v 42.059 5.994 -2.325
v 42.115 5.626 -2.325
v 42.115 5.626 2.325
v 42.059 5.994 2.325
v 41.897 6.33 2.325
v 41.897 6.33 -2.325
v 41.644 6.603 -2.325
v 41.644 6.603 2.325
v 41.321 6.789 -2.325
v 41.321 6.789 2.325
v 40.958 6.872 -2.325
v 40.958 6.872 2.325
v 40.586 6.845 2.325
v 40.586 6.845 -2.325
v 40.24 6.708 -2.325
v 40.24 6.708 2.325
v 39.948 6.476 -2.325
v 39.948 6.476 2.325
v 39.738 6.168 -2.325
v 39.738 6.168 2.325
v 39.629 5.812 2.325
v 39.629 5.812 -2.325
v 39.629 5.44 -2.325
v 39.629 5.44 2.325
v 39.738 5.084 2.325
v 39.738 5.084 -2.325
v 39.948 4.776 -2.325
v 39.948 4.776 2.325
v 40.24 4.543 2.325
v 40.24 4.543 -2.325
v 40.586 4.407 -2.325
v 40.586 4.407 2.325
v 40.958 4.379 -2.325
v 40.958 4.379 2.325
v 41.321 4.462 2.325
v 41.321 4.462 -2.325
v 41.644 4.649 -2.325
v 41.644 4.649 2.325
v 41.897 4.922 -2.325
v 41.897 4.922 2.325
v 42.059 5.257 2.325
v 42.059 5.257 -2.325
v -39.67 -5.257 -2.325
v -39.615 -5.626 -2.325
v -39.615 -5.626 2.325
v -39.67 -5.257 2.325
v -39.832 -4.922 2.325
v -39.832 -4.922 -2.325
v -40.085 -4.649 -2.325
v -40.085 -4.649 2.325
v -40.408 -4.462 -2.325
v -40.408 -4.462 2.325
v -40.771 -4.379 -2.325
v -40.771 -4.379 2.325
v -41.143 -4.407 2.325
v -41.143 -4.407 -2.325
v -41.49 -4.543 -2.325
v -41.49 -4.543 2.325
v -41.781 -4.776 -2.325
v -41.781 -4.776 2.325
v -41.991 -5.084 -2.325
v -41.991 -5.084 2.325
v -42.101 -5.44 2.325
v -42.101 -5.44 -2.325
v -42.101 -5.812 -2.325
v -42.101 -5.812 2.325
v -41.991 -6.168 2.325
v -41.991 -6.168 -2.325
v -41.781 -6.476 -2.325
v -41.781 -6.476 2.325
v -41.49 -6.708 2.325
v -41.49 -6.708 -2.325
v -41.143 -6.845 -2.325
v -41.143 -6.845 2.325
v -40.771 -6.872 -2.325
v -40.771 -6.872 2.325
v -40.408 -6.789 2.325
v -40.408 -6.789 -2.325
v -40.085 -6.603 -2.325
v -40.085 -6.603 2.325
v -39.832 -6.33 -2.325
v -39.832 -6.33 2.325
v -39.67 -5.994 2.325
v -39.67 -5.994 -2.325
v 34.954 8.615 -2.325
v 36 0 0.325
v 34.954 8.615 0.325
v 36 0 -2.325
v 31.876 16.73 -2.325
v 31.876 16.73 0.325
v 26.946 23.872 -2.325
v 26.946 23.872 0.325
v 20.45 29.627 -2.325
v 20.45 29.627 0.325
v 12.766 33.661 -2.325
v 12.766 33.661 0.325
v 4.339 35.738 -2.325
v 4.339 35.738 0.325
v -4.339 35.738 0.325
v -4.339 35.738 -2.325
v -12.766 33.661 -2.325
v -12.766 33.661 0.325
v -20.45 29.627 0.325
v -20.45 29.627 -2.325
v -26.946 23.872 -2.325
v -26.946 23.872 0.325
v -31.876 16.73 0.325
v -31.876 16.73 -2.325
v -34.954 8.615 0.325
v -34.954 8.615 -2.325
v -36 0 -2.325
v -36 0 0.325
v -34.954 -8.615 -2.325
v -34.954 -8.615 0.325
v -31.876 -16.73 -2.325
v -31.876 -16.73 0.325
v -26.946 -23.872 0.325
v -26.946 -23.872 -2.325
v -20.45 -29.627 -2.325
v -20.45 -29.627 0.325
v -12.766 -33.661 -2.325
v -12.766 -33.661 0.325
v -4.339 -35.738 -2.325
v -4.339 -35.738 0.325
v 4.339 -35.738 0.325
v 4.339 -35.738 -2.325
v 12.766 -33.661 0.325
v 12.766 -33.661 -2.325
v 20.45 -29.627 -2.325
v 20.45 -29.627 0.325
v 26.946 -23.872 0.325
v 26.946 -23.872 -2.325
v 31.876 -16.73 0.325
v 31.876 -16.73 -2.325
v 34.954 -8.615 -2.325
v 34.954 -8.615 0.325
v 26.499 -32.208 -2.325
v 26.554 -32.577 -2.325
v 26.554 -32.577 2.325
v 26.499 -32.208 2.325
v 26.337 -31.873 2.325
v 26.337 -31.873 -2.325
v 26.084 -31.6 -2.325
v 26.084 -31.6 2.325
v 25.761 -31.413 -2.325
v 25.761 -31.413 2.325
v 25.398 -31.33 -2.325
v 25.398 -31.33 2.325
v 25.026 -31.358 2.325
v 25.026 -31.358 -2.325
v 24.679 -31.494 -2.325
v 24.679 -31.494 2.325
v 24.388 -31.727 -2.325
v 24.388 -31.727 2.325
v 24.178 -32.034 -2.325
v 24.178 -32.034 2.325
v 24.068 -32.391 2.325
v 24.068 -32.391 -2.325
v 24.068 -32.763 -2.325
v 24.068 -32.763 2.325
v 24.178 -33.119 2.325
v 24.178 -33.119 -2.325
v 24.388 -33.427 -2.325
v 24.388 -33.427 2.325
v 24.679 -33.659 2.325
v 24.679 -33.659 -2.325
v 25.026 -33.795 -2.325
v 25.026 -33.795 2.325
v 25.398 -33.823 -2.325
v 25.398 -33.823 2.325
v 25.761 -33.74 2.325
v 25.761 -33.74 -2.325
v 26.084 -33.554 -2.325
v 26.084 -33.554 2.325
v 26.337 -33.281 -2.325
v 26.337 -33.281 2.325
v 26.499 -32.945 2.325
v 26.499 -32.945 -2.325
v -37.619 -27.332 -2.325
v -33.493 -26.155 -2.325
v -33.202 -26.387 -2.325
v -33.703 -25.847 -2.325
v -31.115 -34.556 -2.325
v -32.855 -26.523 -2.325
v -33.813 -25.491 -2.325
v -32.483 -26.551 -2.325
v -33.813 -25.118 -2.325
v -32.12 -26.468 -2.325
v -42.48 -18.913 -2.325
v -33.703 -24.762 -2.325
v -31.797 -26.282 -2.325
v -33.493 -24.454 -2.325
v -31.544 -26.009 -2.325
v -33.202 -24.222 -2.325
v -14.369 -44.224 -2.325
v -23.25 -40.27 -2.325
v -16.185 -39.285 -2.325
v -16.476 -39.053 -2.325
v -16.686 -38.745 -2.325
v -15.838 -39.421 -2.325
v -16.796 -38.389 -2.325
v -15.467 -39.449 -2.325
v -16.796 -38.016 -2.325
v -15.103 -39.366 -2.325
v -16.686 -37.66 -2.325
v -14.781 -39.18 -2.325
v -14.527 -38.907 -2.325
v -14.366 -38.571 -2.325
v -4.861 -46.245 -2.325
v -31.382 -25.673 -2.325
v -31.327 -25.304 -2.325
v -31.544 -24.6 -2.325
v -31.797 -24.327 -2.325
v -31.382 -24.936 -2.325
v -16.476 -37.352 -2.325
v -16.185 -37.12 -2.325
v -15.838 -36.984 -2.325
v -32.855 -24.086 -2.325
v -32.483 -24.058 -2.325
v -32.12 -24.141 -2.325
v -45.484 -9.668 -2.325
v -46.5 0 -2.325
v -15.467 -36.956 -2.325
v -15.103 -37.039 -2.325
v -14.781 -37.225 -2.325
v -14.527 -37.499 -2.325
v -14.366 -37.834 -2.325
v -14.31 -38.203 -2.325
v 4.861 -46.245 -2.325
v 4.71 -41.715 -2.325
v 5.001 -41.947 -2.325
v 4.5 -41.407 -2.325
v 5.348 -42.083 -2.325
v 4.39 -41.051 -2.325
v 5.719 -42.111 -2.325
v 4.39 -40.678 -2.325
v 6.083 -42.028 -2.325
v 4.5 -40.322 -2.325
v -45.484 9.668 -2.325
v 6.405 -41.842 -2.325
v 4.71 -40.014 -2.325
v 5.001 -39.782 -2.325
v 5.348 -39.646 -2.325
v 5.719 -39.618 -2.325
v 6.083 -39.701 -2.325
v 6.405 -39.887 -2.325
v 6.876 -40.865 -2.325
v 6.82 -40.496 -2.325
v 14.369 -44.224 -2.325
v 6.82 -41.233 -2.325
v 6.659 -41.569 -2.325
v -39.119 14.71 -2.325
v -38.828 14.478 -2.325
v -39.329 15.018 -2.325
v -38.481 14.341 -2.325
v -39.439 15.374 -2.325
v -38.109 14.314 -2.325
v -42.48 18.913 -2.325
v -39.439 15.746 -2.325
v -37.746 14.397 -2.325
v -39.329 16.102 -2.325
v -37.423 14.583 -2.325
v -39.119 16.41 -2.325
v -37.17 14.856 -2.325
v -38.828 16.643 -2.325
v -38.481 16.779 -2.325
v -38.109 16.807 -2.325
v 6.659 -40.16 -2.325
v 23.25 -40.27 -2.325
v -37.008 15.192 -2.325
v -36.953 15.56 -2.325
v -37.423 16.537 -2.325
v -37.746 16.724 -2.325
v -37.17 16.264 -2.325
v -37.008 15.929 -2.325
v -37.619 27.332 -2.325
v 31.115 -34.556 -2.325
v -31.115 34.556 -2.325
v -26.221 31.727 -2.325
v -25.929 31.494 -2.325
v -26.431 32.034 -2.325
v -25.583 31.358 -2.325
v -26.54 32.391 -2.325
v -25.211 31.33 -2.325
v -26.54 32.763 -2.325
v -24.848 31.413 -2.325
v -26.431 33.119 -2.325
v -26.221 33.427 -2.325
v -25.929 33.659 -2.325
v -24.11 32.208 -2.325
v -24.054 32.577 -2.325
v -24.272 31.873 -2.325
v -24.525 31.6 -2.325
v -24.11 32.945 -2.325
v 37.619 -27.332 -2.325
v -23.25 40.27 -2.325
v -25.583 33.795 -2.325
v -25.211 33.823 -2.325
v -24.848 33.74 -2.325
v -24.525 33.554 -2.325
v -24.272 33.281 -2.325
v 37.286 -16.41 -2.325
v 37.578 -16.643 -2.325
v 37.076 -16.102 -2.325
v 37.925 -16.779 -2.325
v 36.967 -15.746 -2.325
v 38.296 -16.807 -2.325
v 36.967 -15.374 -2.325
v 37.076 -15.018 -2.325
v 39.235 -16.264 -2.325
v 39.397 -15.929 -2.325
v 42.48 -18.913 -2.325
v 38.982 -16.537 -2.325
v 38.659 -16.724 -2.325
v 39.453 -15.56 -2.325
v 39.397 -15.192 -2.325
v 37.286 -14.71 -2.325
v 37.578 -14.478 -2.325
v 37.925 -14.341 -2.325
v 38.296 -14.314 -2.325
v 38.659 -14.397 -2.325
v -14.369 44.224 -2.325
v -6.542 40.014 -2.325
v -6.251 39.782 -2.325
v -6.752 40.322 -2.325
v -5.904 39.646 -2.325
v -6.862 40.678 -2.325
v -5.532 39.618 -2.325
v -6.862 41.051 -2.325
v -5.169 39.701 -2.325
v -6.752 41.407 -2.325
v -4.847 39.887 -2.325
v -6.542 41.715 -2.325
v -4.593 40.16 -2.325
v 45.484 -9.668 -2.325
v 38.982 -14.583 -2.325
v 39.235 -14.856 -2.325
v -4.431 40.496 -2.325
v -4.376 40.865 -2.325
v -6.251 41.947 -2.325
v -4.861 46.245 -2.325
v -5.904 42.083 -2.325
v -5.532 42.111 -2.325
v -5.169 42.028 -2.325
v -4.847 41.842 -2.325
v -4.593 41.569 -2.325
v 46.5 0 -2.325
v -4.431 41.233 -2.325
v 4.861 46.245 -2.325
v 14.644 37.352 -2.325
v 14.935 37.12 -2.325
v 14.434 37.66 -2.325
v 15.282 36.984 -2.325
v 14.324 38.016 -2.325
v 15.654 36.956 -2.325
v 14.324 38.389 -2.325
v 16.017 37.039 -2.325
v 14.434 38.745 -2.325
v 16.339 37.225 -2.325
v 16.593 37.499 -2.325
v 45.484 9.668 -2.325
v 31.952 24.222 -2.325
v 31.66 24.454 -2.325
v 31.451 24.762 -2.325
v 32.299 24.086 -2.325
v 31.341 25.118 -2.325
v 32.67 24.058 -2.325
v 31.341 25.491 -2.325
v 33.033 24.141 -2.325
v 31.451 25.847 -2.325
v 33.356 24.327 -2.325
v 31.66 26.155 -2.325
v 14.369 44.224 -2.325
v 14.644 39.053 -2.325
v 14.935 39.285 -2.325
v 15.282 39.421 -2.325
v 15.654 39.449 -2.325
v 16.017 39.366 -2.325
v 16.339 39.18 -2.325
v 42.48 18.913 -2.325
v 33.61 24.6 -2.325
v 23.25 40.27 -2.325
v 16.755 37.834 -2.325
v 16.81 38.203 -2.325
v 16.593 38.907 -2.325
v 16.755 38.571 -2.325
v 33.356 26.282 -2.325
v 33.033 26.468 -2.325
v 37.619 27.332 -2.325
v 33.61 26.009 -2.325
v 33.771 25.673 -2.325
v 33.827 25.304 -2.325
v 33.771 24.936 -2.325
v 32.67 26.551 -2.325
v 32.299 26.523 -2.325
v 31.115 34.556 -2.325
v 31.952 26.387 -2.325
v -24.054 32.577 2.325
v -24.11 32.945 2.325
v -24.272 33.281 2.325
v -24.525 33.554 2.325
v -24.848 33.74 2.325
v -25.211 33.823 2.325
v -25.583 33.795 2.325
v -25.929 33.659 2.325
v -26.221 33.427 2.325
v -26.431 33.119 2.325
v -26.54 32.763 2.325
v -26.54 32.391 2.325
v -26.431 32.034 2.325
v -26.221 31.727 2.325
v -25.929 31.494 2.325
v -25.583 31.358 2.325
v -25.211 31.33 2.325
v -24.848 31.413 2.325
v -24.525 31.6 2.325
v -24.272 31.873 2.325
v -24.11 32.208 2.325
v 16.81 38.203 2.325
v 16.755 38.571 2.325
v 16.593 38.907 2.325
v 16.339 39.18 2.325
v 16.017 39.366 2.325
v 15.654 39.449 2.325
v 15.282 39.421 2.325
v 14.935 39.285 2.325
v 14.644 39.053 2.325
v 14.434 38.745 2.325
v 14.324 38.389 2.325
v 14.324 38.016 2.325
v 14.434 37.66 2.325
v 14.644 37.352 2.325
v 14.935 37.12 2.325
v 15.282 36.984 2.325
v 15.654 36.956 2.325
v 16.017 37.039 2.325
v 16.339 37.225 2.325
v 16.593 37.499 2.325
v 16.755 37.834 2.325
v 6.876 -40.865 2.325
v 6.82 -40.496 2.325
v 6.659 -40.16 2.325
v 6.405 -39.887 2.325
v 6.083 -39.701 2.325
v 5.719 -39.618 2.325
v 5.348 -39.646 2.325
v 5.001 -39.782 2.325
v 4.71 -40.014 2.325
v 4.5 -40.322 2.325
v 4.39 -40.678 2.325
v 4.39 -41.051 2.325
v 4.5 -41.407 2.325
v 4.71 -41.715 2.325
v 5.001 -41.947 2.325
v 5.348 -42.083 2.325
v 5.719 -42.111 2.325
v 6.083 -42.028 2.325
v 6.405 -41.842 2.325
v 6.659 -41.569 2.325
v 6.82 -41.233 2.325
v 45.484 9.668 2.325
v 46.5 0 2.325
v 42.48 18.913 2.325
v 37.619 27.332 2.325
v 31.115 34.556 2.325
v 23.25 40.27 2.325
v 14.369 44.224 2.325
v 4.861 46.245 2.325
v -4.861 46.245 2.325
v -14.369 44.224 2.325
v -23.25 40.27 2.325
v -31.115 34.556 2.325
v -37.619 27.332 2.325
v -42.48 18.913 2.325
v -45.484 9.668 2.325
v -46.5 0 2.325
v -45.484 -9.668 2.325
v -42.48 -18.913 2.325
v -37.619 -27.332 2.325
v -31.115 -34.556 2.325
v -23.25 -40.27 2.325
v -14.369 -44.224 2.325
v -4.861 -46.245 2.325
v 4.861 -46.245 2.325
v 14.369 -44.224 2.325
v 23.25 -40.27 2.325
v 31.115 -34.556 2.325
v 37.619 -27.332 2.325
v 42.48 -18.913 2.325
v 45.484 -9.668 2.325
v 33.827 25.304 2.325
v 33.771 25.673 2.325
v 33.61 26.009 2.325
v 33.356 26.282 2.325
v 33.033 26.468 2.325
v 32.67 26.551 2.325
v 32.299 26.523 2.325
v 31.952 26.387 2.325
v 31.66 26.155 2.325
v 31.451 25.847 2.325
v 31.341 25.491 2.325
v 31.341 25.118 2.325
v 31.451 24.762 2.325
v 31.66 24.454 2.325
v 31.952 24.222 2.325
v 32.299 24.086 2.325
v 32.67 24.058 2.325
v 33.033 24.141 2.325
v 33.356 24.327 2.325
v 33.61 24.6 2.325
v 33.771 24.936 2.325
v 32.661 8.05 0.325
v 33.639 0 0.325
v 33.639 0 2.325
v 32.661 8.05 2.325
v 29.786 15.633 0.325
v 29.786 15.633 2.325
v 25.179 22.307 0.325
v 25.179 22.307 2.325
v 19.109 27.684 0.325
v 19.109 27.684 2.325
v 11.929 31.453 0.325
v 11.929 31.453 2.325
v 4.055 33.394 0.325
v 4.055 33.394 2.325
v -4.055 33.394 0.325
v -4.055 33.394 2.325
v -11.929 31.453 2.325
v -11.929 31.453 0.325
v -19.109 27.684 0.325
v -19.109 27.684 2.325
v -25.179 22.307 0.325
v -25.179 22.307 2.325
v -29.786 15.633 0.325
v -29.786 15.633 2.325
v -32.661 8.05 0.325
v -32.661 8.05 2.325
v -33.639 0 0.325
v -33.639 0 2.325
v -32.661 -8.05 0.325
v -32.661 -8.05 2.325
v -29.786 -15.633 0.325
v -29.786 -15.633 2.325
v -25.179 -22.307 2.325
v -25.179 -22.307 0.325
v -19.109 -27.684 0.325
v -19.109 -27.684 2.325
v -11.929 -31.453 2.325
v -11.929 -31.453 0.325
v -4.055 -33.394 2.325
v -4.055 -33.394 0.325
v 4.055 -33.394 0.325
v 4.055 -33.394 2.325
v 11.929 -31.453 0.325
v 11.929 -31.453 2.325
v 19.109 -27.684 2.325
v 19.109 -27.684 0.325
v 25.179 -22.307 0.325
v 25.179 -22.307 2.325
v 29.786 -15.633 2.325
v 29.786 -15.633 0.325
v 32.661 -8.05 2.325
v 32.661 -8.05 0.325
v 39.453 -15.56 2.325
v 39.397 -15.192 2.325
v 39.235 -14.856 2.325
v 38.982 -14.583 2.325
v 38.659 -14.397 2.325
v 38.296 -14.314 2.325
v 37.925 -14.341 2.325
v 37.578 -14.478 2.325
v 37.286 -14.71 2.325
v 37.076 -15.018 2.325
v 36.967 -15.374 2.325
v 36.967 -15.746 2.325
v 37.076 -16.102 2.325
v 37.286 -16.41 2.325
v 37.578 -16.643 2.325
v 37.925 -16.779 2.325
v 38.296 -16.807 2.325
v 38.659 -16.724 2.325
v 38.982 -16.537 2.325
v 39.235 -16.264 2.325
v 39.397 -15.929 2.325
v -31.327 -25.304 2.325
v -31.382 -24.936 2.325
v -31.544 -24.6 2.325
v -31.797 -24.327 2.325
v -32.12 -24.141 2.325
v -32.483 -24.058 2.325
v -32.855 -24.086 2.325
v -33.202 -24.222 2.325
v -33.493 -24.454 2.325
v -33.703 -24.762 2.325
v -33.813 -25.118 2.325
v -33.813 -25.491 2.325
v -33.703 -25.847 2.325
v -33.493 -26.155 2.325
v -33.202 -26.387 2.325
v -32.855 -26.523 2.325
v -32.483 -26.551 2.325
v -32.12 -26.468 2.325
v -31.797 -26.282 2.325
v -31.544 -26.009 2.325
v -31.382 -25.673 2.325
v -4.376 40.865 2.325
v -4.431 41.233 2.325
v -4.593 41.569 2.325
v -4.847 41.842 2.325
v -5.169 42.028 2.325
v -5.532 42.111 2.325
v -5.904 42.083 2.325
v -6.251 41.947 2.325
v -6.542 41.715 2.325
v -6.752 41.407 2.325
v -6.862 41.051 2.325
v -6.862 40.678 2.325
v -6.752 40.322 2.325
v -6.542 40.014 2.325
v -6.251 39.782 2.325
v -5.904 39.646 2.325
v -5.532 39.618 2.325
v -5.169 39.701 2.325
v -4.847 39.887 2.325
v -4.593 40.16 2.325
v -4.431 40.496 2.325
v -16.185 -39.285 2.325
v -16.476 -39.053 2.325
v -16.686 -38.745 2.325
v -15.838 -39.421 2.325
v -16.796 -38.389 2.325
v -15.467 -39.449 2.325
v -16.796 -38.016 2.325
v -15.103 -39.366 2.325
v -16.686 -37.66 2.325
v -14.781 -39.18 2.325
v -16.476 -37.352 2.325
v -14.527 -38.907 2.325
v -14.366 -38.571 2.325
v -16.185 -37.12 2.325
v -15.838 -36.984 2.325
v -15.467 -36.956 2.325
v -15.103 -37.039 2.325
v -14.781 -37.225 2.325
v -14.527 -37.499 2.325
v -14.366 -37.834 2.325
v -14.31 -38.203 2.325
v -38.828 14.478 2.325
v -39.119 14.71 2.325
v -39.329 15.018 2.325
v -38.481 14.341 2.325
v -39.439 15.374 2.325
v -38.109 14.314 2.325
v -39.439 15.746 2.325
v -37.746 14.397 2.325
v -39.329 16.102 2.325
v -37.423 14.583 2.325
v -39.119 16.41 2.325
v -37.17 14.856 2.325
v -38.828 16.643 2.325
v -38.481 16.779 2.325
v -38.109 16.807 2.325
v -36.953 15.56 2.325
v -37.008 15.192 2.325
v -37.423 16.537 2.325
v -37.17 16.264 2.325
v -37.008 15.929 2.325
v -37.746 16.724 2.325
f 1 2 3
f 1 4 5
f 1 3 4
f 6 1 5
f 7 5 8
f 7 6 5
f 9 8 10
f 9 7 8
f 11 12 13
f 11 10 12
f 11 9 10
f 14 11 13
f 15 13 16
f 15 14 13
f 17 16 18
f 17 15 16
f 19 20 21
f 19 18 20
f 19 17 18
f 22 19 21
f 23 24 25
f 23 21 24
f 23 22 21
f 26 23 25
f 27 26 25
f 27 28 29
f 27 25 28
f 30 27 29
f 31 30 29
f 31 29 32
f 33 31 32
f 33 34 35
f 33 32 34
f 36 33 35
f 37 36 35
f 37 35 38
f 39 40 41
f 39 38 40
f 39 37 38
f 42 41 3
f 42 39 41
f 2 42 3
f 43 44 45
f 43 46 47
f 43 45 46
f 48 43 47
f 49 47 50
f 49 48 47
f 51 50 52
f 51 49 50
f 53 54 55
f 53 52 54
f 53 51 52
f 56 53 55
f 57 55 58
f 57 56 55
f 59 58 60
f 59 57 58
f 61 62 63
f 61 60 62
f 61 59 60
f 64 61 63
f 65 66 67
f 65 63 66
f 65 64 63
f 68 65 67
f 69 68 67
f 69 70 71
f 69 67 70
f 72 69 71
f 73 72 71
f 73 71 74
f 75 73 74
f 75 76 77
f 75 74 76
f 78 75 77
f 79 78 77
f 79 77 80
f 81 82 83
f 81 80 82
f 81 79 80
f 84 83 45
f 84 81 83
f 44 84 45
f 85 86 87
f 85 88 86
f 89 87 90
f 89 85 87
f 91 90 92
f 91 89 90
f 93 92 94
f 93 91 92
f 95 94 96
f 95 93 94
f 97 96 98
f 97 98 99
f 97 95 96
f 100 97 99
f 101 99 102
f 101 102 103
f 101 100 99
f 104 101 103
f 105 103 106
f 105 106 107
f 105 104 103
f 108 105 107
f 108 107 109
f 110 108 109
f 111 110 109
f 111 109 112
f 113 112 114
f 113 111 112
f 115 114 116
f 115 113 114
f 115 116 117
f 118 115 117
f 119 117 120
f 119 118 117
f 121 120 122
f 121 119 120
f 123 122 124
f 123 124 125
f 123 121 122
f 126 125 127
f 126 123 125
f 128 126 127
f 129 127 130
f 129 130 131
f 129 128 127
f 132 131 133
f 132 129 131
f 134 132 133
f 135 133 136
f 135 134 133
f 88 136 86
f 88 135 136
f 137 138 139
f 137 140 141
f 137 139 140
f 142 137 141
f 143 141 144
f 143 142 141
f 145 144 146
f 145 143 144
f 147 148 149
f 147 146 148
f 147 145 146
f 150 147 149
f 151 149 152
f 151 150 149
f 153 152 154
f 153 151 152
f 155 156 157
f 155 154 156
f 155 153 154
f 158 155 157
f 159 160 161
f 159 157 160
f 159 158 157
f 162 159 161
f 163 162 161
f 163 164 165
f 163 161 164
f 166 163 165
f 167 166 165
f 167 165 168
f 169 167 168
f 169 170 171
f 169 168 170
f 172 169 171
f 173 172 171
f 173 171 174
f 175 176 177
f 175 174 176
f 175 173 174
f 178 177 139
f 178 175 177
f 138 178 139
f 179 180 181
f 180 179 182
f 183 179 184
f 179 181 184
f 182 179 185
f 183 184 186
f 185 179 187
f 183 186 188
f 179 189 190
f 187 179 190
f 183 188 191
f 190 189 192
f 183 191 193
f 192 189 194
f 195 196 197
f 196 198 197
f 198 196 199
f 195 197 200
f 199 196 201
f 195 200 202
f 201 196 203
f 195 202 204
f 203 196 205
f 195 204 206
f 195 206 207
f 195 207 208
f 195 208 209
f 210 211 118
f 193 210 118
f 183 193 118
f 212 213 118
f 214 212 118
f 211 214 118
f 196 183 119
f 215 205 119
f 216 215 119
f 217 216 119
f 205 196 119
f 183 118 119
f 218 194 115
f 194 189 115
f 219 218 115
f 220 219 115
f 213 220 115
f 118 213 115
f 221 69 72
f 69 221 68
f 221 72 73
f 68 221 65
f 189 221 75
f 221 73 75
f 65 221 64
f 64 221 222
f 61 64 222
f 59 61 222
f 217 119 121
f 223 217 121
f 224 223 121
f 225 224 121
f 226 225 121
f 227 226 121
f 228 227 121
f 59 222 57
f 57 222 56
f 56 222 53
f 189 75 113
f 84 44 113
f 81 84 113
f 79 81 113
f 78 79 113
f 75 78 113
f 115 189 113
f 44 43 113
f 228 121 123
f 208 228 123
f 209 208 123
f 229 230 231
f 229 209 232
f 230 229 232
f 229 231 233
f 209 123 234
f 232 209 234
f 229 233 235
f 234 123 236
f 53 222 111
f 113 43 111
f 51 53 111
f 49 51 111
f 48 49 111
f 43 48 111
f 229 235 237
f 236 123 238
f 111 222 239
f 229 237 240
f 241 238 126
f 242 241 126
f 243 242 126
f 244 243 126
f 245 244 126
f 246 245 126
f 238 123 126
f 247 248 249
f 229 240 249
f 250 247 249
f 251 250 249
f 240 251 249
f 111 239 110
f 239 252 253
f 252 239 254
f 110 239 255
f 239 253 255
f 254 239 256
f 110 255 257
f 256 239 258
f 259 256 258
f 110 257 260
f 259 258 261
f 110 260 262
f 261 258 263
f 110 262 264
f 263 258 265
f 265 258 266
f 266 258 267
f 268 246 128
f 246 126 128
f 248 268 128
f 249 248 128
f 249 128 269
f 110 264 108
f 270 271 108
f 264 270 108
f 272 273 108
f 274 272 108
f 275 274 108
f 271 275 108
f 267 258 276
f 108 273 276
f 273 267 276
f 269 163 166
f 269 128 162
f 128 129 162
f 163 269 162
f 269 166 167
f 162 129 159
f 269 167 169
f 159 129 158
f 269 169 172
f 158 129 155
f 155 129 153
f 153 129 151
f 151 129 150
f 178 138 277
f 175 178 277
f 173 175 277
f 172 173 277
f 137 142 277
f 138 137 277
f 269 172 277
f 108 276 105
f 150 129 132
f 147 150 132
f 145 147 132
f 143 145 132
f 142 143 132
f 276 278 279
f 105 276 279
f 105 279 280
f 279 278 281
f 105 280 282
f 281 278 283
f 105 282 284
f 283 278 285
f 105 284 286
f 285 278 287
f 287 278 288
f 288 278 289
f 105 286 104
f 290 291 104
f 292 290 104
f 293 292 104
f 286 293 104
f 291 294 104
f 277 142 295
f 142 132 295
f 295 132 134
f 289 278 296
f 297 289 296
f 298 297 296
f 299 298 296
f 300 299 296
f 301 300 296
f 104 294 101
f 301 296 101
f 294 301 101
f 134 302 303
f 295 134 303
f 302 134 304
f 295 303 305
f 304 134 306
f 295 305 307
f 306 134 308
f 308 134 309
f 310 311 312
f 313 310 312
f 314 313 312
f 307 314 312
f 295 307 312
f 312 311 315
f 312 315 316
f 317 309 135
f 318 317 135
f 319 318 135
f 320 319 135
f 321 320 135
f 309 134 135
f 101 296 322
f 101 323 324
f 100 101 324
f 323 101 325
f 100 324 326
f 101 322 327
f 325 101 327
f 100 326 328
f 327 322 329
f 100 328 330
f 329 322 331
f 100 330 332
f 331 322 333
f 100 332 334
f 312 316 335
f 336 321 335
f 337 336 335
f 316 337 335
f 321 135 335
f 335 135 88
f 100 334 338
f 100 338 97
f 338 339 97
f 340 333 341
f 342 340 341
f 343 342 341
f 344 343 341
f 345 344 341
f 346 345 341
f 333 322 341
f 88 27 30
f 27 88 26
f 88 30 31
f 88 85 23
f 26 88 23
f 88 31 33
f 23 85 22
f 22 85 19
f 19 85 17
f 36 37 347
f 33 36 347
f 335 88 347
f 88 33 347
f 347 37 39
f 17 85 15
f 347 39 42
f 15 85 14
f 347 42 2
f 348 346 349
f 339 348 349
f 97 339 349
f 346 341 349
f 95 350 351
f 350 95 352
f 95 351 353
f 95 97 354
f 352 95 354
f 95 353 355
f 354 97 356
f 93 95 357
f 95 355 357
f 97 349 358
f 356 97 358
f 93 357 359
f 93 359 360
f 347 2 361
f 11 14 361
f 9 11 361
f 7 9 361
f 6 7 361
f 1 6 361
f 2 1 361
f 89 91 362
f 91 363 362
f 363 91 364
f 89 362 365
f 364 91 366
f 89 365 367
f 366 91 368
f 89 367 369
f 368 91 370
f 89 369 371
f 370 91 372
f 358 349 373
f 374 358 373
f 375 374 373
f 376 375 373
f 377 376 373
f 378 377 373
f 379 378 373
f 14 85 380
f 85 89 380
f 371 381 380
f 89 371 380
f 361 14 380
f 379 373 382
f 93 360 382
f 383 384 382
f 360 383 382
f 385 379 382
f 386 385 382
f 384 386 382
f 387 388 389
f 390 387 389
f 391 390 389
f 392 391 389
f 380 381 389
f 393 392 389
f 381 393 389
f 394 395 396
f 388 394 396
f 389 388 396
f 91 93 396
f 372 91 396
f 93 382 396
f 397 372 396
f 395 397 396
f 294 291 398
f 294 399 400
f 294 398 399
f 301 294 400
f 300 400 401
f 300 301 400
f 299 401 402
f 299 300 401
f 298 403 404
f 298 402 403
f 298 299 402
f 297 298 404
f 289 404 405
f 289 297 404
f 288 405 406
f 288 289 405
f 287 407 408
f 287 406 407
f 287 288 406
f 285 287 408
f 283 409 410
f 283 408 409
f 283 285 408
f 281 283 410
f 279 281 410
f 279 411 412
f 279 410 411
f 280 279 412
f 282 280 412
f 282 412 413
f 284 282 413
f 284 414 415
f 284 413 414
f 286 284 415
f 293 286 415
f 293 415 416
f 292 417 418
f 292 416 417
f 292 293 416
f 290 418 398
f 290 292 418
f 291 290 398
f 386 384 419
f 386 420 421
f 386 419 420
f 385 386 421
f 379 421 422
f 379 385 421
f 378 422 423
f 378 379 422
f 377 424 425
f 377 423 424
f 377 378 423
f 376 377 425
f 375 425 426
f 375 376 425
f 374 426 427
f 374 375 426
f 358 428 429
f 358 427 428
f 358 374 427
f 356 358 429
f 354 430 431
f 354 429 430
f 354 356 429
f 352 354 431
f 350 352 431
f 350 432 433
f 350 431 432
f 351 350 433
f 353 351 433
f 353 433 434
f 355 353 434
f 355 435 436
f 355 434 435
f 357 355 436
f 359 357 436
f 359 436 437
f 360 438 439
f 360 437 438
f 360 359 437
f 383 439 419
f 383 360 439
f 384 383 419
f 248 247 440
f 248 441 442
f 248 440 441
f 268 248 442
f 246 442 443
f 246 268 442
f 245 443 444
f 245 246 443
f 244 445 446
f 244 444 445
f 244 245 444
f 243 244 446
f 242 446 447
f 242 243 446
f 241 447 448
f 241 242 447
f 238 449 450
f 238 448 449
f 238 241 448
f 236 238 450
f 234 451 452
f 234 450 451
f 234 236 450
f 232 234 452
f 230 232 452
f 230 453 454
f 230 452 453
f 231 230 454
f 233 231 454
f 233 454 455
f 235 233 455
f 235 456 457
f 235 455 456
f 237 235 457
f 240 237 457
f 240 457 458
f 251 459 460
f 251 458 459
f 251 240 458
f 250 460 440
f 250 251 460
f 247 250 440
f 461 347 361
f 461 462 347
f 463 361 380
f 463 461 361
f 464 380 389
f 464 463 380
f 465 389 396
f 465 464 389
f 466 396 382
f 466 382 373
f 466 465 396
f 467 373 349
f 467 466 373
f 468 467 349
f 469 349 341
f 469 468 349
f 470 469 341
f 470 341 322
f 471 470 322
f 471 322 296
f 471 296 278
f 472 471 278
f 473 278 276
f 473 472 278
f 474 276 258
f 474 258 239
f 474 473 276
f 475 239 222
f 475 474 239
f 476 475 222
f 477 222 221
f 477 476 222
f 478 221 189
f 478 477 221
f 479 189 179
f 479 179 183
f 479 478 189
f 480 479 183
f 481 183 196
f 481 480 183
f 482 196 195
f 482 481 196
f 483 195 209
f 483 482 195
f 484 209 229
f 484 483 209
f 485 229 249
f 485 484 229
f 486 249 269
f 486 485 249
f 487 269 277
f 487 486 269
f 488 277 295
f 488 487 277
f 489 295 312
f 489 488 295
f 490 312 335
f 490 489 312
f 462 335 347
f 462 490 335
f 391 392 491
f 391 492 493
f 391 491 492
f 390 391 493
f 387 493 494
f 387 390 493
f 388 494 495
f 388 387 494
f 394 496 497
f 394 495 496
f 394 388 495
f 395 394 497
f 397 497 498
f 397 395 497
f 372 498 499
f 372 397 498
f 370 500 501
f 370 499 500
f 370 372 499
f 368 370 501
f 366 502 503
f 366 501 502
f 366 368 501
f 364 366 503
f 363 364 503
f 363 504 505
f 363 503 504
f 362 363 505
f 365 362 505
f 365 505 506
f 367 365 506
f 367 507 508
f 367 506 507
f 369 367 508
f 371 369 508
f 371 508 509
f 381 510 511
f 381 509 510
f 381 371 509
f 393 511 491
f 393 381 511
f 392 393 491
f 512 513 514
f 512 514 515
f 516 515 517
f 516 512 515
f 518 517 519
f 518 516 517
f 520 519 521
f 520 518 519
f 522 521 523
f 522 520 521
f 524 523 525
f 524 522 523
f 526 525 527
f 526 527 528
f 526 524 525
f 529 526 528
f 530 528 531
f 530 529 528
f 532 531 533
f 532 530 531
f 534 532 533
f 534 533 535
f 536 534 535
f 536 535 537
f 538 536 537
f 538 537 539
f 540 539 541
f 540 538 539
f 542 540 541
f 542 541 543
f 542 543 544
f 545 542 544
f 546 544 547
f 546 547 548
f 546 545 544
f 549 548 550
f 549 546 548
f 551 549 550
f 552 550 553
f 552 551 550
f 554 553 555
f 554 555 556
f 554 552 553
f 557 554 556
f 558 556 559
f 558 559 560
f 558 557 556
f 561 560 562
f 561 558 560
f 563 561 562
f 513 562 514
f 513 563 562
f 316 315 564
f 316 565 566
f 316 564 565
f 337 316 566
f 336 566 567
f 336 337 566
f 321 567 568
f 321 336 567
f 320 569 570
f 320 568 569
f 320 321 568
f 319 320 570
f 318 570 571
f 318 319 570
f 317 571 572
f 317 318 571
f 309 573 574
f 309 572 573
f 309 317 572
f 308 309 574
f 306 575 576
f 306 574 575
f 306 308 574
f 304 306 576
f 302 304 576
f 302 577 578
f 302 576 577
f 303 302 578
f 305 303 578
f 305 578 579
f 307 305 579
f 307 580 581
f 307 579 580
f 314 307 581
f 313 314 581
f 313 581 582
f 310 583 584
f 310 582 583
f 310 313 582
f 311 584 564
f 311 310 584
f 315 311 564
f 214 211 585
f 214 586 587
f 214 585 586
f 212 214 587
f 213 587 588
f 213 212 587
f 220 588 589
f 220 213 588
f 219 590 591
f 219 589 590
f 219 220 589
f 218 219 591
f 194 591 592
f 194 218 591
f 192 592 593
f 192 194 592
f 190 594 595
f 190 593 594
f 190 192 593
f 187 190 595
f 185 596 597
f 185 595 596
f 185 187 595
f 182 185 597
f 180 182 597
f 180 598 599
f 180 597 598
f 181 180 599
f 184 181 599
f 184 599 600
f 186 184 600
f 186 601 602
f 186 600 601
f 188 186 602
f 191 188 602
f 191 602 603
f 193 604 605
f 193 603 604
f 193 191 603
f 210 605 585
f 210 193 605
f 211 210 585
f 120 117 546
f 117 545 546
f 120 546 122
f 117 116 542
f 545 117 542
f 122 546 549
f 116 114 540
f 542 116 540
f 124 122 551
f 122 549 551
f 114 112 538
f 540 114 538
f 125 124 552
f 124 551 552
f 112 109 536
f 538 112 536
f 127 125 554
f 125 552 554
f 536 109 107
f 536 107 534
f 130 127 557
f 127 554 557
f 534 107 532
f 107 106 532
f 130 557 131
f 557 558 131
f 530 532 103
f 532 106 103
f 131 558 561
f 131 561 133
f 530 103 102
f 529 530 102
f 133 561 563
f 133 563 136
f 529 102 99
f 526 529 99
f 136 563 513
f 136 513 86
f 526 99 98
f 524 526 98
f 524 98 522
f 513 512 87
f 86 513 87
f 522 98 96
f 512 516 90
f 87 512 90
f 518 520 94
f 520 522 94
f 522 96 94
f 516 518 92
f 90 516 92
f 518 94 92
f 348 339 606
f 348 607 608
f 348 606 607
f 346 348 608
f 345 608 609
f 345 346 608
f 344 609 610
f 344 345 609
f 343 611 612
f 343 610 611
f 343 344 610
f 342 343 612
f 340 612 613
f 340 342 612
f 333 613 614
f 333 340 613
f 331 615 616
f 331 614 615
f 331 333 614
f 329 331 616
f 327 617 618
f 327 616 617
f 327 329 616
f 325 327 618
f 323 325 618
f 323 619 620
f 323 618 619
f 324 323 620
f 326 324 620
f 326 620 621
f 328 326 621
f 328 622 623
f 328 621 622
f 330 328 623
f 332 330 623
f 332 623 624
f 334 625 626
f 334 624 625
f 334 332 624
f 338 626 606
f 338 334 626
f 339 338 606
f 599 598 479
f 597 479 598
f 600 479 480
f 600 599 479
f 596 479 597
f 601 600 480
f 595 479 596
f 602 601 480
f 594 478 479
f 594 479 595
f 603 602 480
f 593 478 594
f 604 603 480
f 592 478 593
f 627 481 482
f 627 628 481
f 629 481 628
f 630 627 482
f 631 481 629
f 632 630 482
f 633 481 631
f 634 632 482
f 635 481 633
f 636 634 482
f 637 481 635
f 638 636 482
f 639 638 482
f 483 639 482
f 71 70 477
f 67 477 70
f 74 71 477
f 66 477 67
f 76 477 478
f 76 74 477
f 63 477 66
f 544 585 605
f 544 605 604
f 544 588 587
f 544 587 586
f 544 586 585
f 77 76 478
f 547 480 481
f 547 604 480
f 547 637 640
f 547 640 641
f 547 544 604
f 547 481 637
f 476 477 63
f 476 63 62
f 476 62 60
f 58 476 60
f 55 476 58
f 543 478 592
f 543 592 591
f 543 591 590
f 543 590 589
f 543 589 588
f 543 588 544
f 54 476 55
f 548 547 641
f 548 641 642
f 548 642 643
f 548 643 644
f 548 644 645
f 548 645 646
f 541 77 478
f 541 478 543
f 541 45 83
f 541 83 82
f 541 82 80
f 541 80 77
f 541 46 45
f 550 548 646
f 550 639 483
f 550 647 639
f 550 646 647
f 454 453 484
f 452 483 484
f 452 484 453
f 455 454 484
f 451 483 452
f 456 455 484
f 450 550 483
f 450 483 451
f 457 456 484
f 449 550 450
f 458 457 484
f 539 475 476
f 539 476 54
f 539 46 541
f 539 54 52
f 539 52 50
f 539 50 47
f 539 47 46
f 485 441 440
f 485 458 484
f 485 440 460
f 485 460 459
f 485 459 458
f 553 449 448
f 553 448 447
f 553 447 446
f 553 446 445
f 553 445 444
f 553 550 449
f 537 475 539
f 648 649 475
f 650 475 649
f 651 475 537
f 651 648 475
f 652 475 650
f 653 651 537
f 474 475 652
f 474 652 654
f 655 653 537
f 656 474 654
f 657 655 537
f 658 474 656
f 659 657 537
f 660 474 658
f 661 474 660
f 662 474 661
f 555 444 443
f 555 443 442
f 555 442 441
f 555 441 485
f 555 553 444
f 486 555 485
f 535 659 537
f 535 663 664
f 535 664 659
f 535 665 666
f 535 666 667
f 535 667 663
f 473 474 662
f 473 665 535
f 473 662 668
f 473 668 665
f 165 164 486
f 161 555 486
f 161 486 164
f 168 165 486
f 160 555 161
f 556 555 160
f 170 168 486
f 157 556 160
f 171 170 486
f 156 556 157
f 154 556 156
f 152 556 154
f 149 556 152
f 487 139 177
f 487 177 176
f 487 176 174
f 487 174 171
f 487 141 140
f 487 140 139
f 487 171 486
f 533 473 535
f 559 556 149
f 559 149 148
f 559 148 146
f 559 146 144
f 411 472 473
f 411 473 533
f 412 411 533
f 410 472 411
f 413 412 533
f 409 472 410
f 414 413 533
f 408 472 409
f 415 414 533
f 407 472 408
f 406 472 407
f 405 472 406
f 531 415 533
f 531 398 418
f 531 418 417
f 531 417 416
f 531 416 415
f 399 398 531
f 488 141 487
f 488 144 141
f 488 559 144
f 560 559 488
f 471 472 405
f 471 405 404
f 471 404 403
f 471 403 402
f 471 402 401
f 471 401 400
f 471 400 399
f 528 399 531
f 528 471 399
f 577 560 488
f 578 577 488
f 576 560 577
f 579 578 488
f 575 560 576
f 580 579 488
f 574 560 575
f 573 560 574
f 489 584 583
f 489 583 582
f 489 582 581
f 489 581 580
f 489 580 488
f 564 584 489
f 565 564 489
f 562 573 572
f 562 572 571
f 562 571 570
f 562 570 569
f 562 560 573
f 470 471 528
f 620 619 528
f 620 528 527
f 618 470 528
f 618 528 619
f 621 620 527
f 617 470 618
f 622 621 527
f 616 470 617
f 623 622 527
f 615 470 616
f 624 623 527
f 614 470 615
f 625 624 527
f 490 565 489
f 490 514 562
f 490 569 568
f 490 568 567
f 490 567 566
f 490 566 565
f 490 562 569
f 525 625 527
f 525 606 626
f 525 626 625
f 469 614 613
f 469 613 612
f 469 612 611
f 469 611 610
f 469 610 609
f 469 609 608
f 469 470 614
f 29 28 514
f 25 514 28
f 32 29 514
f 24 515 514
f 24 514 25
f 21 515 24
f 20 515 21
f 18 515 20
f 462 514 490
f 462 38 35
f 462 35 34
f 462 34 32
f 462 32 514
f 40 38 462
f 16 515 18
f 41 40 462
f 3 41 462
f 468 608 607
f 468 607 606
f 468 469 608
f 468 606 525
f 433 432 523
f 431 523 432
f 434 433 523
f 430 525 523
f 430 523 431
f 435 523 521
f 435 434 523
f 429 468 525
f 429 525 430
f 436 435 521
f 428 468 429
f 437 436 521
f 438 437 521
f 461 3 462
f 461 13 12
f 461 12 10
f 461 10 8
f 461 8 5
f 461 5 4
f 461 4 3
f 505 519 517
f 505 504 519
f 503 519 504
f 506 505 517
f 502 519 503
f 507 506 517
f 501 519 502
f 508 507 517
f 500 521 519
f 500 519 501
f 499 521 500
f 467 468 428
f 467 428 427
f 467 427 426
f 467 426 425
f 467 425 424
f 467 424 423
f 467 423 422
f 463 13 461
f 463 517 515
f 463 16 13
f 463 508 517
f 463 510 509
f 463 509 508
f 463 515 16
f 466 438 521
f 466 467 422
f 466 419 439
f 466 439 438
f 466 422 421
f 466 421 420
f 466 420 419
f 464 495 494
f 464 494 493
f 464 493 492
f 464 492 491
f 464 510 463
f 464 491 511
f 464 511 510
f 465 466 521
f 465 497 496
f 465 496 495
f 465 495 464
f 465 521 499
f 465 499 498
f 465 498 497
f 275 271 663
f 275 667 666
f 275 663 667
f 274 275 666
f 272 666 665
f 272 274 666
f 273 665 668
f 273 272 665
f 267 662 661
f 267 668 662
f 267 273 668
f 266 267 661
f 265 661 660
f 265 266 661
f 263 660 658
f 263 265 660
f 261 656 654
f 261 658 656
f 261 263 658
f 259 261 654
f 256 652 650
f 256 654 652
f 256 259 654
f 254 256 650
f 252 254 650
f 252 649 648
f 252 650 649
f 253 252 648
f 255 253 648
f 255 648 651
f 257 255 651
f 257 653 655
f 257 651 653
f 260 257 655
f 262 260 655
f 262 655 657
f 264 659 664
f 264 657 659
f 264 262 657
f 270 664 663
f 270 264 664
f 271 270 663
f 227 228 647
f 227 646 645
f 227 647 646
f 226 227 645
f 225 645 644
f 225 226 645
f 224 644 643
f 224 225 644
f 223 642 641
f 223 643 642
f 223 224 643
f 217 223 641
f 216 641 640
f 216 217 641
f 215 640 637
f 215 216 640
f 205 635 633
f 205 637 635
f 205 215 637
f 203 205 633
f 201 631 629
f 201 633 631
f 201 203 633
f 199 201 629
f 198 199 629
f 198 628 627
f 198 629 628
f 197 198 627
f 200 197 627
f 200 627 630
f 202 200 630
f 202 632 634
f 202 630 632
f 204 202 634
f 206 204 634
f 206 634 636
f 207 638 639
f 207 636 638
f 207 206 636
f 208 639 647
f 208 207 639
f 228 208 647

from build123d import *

# Parameters (mm, degrees)
SKETCH1_R               = 46.5
SKETCH1_R_2             = 36
BOSS_EXTRUDE1_DEPTH     = 2.325
BOSS_EXTRUDE2_START     = -2
SKETCH2_R               = 36
SKETCH2_R_2             = 33.63888889
BOSS_EXTRUDE2_DEPTH     = 2
CUT_EXTRUDE1_DEPTH      = 66.925127986
CUT_EXTRUDE1_DEPTH_BACK = 66.925127986
SKETCH3_R               = 1.25


with BuildPart() as part:
    # Sketch1 → Boss-Extrude1 (new, symmetric)
    with BuildSketch(Plane.XY):
        Circle(SKETCH1_R)
        Circle(SKETCH1_R_2, mode=Mode.SUBTRACT)
    extrude(amount=BOSS_EXTRUDE1_DEPTH, both=True)

    # Sketch2 → Boss-Extrude2 (add)
    with BuildSketch(Plane.XY.offset(2.325).offset(BOSS_EXTRUDE2_START)):
        Circle(SKETCH2_R)
        Circle(SKETCH2_R_2, mode=Mode.SUBTRACT)
    extrude(amount=BOSS_EXTRUDE2_DEPTH)

    # Sketch3 → Cut-Extrude1 (cut, two sides: drawn at the far end of the back side and taken through both)
    with BuildSketch(Plane.XY.offset(2.325).offset(-CUT_EXTRUDE1_DEPTH_BACK)):
        with Locations((-15.560126668, -38.202682603)):
            Circle(SKETCH3_R)
        with Locations((-32.576806282, -25.304430293)):
            Circle(SKETCH3_R)
        with Locations((-40.864556961, -5.625876321)):
            Circle(SKETCH3_R)
        with Locations((-38.202682603, 15.560126668)):
            Circle(SKETCH3_R)
        with Locations((-25.304430293, 32.576806282)):
            Circle(SKETCH3_R)
        with Locations((-5.625876321, 40.864556961)):
            Circle(SKETCH3_R)
        with Locations((15.560126668, 38.202682603)):
            Circle(SKETCH3_R)
        with Locations((32.576806282, 25.304430293)):
            Circle(SKETCH3_R)
        with Locations((40.864556961, 5.625876321)):
            Circle(SKETCH3_R)
        with Locations((38.202682603, -15.560126668)):
            Circle(SKETCH3_R)
        with Locations((25.304430293, -32.576806282)):
            Circle(SKETCH3_R)
        with Locations((5.625876321, -40.864556961)):
            Circle(SKETCH3_R)
    extrude(amount=CUT_EXTRUDE1_DEPTH + CUT_EXTRUDE1_DEPTH_BACK, mode=Mode.SUBTRACT)


solid = part.part
